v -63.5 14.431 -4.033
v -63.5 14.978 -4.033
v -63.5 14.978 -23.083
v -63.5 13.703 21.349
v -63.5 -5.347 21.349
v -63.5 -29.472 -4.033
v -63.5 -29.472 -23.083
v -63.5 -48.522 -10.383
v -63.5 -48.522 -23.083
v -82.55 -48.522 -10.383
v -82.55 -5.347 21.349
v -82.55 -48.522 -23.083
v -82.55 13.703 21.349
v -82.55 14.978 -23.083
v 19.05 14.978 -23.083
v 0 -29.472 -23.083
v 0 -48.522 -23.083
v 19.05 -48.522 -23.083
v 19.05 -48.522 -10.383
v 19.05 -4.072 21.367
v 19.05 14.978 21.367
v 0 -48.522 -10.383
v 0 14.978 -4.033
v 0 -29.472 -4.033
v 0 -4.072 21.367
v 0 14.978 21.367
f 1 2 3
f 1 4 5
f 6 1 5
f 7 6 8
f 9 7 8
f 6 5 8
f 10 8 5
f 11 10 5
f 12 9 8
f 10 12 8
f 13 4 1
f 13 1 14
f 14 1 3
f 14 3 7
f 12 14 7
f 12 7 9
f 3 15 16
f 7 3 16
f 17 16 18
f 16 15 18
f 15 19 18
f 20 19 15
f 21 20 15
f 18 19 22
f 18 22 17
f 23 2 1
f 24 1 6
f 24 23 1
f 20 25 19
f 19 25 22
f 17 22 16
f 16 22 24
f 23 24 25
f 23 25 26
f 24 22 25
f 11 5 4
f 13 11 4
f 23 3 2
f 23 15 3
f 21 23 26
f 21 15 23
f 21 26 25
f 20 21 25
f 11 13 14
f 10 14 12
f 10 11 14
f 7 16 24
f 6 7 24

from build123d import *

# Parameters (mm, degrees)
F1_DEPTH = 19.05
F2_W     = 44.45
F2_H     = 19.05
F3_DEPTH = 63.5
F5_DEPTH = 19.05


with BuildPart() as f1:
    # F0 (on Right) → F1 (new body)
    with BuildSketch(Plane.YZ):
        Polygon((14.978143, 21.367056), (-4.071857, 21.367056), (-48.521857, -10.382944), (-48.521857, -23.082944), (14.978143, -23.082944), align=None)
    extrude(amount=F1_DEPTH)

    # F2 (on face) → F3 (join)
    with BuildSketch(Plane(origin=(0, 0, 0), x_dir=(0, -1, 0), z_dir=(-1, 0, 0))):
        with Locations((7.246857, -13.557944)):
            Rectangle(F2_W, F2_H)
    extrude(amount=F3_DEPTH)

    # F4 (on face) → F5 (join)
    with BuildSketch(Plane(origin=(-63.5, 0, 0), x_dir=(0, -1, 0), z_dir=(-1, 0, 0))):
        Polygon((-13.703029, 21.348763), (-14.978143, -23.082944), (48.521857, -23.082944), (48.521857, -10.382944), (5.346971, 21.348763), align=None)
    extrude(amount=F5_DEPTH)


solid = f1.part
